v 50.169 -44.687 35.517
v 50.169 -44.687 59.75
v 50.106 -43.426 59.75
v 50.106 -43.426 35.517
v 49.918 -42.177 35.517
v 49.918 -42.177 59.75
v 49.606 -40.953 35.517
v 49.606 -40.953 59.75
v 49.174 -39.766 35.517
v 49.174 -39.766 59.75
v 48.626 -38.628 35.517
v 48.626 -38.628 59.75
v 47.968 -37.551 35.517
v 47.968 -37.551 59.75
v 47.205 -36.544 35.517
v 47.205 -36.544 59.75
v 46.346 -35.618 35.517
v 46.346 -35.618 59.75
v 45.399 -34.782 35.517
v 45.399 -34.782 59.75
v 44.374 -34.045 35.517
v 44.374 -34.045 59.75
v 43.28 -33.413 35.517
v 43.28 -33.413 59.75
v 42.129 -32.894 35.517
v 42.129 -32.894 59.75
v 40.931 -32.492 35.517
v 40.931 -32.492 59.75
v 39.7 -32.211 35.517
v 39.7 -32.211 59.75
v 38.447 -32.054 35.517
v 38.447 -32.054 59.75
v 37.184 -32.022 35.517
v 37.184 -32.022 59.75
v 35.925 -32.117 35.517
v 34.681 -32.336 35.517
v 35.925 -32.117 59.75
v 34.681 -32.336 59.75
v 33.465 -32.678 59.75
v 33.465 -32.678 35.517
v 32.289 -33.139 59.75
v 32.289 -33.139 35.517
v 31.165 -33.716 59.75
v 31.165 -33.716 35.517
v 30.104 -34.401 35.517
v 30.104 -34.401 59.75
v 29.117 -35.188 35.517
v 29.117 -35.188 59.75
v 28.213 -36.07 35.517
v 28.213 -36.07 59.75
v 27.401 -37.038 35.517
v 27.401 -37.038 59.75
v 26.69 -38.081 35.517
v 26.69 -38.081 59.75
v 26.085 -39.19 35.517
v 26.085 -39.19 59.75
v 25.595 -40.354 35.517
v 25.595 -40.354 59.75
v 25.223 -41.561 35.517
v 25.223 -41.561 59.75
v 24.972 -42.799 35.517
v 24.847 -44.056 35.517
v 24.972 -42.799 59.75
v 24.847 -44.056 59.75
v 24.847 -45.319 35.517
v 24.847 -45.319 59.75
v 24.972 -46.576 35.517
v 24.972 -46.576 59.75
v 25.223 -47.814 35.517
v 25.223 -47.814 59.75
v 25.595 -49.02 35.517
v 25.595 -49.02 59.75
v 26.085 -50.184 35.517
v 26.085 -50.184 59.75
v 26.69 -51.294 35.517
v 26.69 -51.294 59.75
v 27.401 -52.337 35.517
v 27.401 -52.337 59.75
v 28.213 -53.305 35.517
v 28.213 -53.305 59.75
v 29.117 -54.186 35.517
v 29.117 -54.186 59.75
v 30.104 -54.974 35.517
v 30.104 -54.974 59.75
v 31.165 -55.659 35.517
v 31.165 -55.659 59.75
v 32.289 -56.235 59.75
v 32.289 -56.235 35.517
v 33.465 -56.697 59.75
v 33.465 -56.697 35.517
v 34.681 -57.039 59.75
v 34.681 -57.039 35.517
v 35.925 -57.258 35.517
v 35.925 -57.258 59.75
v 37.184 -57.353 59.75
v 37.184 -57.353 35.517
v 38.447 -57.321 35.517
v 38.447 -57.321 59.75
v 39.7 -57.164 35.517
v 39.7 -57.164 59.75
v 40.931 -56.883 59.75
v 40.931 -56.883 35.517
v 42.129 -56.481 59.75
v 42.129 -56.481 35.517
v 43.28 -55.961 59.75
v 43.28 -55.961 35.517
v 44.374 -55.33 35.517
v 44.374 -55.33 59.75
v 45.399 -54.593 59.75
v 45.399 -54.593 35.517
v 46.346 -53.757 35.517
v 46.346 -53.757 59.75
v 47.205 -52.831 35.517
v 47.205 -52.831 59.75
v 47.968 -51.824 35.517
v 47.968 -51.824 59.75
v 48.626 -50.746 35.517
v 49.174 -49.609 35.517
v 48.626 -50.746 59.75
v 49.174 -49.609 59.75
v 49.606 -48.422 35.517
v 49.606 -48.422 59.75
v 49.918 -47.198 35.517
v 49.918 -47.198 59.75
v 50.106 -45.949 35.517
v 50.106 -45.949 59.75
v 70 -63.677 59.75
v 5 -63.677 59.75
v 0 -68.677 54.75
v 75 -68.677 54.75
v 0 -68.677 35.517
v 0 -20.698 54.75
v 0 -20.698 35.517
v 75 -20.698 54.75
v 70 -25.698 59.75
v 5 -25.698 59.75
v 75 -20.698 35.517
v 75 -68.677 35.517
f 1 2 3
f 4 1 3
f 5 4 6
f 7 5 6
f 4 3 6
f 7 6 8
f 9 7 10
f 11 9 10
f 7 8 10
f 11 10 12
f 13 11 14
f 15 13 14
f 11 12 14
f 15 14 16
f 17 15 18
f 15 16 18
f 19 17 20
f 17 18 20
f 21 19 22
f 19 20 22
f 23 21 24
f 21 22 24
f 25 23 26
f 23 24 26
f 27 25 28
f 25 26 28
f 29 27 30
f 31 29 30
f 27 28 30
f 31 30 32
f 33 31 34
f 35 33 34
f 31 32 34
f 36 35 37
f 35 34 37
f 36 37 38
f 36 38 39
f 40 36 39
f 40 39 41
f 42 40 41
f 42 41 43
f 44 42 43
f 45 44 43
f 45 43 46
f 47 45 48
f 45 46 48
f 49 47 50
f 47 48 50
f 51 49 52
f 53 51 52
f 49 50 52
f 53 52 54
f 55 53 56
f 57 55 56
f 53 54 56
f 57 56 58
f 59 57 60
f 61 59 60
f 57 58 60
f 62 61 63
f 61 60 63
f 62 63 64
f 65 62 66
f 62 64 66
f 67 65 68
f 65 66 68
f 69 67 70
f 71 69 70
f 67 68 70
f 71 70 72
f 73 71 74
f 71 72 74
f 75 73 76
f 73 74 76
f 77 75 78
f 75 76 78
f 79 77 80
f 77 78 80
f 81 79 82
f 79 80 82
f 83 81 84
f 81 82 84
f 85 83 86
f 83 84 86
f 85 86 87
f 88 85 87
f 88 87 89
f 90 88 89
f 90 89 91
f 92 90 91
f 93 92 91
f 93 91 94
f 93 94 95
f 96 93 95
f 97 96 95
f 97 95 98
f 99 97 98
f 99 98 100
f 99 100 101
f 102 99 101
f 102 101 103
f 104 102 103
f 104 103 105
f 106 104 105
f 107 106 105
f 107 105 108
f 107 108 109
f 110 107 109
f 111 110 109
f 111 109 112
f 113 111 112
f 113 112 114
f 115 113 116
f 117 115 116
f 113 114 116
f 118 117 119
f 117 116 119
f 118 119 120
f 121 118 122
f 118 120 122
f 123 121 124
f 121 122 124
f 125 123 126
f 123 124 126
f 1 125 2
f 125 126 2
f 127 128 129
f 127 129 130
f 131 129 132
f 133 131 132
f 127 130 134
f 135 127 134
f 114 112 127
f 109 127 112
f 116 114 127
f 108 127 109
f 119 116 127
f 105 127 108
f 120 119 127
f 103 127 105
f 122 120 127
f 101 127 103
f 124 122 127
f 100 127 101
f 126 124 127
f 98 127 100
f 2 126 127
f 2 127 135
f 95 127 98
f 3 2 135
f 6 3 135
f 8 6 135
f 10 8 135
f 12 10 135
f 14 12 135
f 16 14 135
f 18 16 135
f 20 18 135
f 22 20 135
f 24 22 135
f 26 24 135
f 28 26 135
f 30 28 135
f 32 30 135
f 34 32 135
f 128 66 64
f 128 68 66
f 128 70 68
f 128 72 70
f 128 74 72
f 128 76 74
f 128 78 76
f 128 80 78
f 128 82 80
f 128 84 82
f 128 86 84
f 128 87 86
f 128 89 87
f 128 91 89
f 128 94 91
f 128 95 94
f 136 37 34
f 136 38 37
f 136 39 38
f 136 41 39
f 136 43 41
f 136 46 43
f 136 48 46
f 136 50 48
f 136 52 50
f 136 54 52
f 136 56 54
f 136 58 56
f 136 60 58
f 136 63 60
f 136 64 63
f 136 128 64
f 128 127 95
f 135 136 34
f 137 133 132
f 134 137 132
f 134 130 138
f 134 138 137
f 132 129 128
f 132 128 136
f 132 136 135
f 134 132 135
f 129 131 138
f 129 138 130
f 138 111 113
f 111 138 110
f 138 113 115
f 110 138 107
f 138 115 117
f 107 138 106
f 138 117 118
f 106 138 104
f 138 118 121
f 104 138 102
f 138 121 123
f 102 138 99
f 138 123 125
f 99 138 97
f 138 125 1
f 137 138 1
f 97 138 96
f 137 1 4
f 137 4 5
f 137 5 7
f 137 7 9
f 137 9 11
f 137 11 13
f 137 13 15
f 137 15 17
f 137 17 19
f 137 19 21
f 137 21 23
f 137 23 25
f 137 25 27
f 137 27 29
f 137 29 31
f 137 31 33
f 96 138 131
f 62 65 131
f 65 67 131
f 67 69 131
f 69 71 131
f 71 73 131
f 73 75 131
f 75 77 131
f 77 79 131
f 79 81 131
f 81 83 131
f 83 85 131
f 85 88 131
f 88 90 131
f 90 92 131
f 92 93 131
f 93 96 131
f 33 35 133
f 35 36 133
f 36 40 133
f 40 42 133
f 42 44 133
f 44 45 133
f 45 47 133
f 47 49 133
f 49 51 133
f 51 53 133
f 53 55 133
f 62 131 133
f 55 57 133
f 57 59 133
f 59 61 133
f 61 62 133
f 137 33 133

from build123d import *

# Parameters (mm, degrees)
F0_W     = 47.9789283127
F0_H     = 24.23273772
F1_DEPTH = 75
F2_SIZE  = 5
F3_R     = 12.6691800878
F4_DEPTH = 24.23273772


with BuildPart() as f1:
    # F0 (on Right) → F1 (new body)
    with BuildSketch(Plane.YZ):
        with Locations((-44.6873651817, 47.6334765553)):
            Rectangle(F0_W, F0_H)
    extrude(amount=F1_DEPTH)

    # F2
    f2_edges = [f1.edges().sort_by_distance(p)[0] for p in [
        (37.5, -68.676829, 59.749845),
        (37.5, -20.697901, 59.749845),
        (75, -44.687365, 59.749845),
        (0, -44.687365, 59.749845),
    ]]
    chamfer(f2_edges, length=F2_SIZE)

    # F3 (on face) → F4 (cut, through all)
    with BuildSketch(Plane.XY.offset(59.7498454154)):
        with Locations((37.5, -44.6873651817)):
            Circle(F3_R)
    extrude(amount=-F4_DEPTH, mode=Mode.SUBTRACT)


solid = f1.part
